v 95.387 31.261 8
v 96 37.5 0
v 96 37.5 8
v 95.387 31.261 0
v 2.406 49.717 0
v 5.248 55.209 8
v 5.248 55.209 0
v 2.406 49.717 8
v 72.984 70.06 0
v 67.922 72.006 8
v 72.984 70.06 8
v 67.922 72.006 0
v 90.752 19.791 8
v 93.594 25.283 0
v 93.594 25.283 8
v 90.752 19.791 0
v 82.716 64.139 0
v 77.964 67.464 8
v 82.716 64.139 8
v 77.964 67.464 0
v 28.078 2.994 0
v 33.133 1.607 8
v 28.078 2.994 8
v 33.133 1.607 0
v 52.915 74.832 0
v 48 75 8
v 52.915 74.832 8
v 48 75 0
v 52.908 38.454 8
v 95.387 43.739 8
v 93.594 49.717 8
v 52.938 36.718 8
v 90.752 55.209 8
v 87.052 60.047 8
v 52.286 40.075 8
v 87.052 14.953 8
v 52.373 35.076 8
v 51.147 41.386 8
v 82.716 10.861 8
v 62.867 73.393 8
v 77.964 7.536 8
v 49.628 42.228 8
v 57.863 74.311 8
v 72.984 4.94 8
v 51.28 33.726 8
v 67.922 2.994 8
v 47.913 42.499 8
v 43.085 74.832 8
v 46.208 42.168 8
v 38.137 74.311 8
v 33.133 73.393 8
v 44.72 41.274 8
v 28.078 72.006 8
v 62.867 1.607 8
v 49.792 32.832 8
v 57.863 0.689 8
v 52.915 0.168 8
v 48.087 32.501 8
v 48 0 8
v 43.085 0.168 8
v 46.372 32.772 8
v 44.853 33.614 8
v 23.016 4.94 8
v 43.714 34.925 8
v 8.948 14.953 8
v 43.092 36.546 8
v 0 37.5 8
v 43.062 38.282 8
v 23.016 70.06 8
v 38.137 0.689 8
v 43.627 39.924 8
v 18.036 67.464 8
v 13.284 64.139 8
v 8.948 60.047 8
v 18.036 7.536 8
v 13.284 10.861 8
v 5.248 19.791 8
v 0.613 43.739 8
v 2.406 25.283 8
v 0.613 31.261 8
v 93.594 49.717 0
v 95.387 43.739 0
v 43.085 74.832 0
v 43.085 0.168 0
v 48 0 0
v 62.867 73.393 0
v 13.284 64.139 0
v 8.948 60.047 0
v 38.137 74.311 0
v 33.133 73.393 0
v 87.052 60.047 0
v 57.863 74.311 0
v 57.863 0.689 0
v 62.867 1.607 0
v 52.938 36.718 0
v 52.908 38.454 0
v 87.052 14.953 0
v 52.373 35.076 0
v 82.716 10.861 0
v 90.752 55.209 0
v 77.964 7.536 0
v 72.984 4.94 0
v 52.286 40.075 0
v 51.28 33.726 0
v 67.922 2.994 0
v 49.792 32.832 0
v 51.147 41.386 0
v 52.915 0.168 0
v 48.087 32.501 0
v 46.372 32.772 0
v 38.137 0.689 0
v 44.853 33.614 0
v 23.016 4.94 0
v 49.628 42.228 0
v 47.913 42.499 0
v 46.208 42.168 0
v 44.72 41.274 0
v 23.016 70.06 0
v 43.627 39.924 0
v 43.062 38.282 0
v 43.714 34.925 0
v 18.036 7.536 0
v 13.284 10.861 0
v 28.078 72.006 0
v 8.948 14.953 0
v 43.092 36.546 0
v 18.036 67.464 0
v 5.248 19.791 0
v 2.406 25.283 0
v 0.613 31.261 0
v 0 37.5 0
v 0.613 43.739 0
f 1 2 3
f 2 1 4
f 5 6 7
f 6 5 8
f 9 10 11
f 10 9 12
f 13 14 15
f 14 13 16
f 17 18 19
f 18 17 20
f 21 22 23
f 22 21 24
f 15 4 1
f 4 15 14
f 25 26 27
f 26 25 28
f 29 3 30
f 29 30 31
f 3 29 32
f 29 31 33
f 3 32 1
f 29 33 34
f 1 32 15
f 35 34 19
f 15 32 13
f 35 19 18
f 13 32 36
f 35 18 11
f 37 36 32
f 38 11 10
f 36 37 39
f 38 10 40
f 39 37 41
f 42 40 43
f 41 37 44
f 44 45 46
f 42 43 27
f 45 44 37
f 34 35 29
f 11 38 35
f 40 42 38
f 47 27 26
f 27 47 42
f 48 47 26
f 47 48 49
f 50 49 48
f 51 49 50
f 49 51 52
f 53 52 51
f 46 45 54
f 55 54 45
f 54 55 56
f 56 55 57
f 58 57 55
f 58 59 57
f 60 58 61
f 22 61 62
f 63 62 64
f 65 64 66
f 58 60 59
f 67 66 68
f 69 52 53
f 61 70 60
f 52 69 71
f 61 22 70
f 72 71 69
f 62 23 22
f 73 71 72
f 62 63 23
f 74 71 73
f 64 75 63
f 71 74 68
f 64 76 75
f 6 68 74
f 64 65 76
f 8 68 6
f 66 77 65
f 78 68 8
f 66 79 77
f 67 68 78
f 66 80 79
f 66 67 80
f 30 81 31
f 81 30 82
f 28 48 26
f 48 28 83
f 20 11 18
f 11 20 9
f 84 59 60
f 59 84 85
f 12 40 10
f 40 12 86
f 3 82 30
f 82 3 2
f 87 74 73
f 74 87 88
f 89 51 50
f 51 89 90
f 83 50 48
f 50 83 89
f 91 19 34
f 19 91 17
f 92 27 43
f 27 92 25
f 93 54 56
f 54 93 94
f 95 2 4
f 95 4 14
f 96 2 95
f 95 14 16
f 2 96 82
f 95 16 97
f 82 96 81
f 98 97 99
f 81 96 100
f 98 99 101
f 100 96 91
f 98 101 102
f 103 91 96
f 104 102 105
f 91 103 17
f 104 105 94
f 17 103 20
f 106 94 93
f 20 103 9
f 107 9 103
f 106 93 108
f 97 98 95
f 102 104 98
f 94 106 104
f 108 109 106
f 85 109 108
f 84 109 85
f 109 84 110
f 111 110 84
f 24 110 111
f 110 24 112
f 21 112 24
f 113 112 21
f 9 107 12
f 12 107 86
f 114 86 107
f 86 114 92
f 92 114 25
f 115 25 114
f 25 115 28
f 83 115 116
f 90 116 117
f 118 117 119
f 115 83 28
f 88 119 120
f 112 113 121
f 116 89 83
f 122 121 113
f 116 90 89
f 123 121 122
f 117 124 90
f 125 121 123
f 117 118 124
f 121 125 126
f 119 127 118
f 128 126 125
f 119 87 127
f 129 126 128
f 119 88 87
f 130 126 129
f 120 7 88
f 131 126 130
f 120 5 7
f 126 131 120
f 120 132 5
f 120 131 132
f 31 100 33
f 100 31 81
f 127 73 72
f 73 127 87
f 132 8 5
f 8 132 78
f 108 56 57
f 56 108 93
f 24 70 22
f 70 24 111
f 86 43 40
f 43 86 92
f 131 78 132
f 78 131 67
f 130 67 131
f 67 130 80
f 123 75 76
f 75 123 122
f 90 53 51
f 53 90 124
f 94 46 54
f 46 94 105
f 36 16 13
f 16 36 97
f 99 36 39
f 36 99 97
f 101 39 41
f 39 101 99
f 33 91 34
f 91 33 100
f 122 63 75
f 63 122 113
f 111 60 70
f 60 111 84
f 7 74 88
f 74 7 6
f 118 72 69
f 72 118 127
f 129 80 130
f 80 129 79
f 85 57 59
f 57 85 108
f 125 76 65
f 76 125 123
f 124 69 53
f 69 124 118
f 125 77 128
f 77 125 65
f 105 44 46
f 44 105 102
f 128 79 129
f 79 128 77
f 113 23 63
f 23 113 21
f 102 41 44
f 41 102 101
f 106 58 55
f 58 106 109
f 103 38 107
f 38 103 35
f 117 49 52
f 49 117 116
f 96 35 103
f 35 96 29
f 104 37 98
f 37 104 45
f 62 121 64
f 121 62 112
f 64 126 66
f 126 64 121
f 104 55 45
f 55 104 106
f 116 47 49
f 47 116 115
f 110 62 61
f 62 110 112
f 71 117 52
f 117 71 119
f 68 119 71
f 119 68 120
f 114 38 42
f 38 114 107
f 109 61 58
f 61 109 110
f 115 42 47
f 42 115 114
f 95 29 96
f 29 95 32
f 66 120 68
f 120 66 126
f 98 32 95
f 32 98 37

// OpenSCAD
$fn = 32;

// ----------------------------------------------------------------------
// Cam plate: double_lobe cam, base R36
// ----------------------------------------------------------------------

// --- parameters (mm) ---
base_r = 36;              // base circle radius
lobe_h = 12;              // cam lobe rise
bore_r = 5;               // shaft bore radius
plate_t = 8;              // plate thickness, Z (extrusion height)
fit_tol = 0.05;           // declared fit tolerance (prompt contract)
free_tol = 0.2;           // declared free tolerance (prompt contract)

profile = [[96, 37.5], [95.387, 43.739], [93.594, 49.717], [90.752, 55.209], [87.052, 60.047], [82.716, 64.139], [77.964, 67.464], [72.984, 70.06], [67.922, 72.006], [62.867, 73.393], [57.863, 74.311], [52.915, 74.832], [48, 75], [43.085, 74.832], [38.137, 74.311], [33.133, 73.393], [28.078, 72.006], [23.016, 70.06], [18.036, 67.464], [13.284, 64.139], [8.948, 60.047], [5.248, 55.209], [2.406, 49.717], [0.613, 43.739], [0, 37.5], [0.613, 31.261], [2.406, 25.283], [5.248, 19.791], [8.948, 14.953], [13.284, 10.861], [18.036, 7.536], [23.016, 4.94], [28.078, 2.994], [33.133, 1.607], [38.137, 0.689], [43.085, 0.168], [48, 0], [52.915, 0.168], [57.863, 0.689], [62.867, 1.607], [67.922, 2.994], [72.984, 4.94], [77.964, 7.536], [82.716, 10.861], [87.052, 14.953], [90.752, 19.791], [93.594, 25.283], [95.387, 31.261]];  // primary outline, 48 points, counter clockwise
void_1 = [[52.908, 38.454], [52.286, 40.075], [51.147, 41.386], [49.628, 42.228], [47.913, 42.499], [46.208, 42.168], [44.72, 41.274], [43.627, 39.924], [43.062, 38.282], [43.092, 36.546], [43.714, 34.925], [44.853, 33.614], [46.372, 32.772], [48.087, 32.501], [49.792, 32.832], [51.28, 33.726], [52.373, 35.076], [52.938, 36.718]];  // shaft bore, 18 points

// --- the one profile operation ---
difference() {
  linear_extrude(height = plate_t) polygon(points = profile);
  translate([0, 0, -1])
    linear_extrude(height = plate_t + 2) polygon(points = void_1);
}
